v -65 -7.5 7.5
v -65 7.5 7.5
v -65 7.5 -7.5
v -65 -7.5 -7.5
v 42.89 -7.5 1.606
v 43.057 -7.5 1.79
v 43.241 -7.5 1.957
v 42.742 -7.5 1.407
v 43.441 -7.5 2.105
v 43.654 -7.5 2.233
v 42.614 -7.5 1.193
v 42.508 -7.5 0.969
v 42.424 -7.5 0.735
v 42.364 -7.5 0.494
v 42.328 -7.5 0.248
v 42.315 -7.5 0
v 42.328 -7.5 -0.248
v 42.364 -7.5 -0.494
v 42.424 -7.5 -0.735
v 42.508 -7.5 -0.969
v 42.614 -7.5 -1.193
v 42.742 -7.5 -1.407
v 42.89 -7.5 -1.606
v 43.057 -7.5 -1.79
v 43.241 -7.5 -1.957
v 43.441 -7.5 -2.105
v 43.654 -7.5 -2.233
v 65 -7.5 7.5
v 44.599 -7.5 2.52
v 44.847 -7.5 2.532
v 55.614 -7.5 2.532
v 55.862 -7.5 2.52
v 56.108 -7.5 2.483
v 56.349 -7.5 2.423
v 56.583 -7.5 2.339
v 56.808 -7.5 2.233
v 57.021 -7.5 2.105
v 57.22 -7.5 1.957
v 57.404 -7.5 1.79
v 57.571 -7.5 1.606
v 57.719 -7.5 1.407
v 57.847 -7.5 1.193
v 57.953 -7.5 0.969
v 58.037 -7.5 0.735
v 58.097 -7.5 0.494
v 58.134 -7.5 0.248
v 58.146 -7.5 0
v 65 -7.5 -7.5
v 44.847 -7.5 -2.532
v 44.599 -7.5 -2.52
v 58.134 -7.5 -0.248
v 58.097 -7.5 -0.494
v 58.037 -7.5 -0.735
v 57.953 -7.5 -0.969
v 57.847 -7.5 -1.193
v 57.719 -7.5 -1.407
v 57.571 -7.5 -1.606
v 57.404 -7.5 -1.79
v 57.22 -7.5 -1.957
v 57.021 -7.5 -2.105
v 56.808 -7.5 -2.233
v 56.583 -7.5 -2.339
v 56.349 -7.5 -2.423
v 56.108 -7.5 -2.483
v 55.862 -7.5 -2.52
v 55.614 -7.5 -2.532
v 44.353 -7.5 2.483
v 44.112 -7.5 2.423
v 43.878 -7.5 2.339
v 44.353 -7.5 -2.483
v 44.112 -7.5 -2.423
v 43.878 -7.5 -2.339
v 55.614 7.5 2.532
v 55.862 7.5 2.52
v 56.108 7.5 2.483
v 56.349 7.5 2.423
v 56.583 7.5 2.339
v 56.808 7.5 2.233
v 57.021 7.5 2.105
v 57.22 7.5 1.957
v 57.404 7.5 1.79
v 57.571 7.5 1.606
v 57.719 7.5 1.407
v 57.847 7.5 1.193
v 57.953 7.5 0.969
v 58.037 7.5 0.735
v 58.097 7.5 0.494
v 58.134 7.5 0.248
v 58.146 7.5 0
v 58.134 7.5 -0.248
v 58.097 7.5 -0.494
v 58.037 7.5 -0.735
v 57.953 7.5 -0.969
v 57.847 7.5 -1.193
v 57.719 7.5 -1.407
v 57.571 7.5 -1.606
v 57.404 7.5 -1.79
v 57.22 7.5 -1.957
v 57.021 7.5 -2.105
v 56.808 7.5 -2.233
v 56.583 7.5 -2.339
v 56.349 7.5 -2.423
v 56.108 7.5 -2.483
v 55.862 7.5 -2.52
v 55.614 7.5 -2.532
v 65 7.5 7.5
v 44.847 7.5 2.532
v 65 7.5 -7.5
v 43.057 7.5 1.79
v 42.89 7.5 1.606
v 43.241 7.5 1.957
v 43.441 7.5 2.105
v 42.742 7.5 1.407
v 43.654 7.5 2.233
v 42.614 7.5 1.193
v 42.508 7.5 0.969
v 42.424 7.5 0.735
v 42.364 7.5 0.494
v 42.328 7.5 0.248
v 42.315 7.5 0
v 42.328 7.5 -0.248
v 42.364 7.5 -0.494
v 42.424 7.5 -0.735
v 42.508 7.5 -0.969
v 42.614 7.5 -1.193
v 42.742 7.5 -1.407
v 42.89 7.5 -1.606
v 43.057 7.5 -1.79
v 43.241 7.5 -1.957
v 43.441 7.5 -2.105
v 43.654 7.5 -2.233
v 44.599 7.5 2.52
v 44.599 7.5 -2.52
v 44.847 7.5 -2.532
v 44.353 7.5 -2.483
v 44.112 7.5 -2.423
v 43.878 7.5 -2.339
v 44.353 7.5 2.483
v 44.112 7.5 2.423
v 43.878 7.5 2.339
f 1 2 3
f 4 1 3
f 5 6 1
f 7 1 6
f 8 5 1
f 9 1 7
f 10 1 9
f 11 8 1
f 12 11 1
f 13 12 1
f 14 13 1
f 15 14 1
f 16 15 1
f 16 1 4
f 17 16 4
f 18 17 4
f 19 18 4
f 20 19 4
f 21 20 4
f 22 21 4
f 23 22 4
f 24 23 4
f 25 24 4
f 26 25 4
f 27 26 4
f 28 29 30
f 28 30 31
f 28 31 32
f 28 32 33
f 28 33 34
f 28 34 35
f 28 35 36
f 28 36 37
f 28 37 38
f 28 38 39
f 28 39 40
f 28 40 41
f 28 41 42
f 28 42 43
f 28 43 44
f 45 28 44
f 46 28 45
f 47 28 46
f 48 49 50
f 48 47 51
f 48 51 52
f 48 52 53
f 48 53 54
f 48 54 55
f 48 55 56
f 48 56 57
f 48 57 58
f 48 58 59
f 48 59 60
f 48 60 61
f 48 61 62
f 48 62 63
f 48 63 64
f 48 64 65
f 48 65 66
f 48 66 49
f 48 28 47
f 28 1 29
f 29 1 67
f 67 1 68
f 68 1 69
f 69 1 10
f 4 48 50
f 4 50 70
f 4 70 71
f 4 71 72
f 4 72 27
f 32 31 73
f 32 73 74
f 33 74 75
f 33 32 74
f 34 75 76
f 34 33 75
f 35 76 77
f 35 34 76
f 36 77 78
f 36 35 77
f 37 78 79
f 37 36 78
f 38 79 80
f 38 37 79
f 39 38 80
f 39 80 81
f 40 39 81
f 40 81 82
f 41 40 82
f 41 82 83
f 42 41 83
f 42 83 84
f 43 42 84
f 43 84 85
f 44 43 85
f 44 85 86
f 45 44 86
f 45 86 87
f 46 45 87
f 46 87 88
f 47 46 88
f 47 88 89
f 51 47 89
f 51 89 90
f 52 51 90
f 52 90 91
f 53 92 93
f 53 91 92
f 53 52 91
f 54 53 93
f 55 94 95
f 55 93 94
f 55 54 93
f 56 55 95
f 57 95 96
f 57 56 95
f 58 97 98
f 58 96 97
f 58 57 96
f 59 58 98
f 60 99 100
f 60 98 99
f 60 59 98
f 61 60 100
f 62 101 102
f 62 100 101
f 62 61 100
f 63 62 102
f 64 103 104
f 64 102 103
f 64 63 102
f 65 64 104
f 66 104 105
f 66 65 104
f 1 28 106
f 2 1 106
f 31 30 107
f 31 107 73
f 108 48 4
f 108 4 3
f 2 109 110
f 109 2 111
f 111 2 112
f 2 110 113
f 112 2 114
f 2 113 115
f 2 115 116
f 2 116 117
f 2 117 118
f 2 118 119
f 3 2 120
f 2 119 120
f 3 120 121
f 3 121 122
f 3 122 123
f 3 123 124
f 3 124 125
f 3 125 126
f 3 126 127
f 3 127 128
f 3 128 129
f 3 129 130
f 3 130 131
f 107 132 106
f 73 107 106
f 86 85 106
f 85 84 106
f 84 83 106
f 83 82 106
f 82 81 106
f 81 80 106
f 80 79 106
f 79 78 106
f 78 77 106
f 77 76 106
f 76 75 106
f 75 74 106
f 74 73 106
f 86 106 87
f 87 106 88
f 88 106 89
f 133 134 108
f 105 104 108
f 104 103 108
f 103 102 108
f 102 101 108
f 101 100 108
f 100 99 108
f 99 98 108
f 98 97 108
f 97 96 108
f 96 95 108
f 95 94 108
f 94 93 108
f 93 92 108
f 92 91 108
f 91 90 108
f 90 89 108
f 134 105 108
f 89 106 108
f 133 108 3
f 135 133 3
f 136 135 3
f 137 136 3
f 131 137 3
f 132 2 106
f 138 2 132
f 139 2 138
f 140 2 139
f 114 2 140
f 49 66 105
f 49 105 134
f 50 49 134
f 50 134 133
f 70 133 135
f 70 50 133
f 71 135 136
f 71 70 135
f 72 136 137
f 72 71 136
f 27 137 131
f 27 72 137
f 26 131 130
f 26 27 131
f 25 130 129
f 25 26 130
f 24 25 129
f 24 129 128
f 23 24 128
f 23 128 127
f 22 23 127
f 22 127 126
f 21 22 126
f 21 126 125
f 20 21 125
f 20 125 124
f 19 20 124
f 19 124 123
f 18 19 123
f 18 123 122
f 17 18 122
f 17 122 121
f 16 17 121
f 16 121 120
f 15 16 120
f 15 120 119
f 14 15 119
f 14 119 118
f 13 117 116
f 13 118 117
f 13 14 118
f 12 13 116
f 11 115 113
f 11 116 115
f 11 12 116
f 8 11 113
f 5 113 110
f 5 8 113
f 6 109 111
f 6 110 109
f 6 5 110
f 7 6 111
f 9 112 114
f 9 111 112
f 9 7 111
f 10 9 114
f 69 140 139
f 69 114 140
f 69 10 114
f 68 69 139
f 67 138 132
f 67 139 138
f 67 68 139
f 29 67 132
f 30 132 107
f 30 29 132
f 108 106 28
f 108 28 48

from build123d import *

# Parameters (mm, degrees)
CROQUIS1_W              = 15
CROQUIS1_H              = 15
SALIENTE_EXTRUIR1_DEPTH = 65
CORTAR_EXTRUIR1_DEPTH   = 68.12860791


with BuildPart() as part:
    # Croquis1 → Saliente-Extruir1 (new, symmetric)
    with BuildSketch(Plane(origin=(0, 0, 0), x_dir=(0, 0, -1), z_dir=(1, 0, 0))):
        Rectangle(CROQUIS1_W, CROQUIS1_H)
    extrude(amount=SALIENTE_EXTRUIR1_DEPTH, both=True)

    # Croquis2 → Cortar-Extruir1 (cut, through all)
    with BuildSketch(Plane.XZ.offset(7.5)):
        with BuildLine():
            Line((44.847129428, 2.531795375), (55.614029525, 2.531795375))
            ThreePointArc((55.614029525, 2.531795375), (58.1458249, 0), (55.614029525, -2.531795375))
            Line((55.614029525, -2.531795375), (44.847129428, -2.531795375))
            ThreePointArc((44.847129428, -2.531795375), (42.315334053, 0), (44.847129428, 2.531795375))
        make_face()
    extrude(amount=-CORTAR_EXTRUIR1_DEPTH, mode=Mode.SUBTRACT)


solid = part.part
